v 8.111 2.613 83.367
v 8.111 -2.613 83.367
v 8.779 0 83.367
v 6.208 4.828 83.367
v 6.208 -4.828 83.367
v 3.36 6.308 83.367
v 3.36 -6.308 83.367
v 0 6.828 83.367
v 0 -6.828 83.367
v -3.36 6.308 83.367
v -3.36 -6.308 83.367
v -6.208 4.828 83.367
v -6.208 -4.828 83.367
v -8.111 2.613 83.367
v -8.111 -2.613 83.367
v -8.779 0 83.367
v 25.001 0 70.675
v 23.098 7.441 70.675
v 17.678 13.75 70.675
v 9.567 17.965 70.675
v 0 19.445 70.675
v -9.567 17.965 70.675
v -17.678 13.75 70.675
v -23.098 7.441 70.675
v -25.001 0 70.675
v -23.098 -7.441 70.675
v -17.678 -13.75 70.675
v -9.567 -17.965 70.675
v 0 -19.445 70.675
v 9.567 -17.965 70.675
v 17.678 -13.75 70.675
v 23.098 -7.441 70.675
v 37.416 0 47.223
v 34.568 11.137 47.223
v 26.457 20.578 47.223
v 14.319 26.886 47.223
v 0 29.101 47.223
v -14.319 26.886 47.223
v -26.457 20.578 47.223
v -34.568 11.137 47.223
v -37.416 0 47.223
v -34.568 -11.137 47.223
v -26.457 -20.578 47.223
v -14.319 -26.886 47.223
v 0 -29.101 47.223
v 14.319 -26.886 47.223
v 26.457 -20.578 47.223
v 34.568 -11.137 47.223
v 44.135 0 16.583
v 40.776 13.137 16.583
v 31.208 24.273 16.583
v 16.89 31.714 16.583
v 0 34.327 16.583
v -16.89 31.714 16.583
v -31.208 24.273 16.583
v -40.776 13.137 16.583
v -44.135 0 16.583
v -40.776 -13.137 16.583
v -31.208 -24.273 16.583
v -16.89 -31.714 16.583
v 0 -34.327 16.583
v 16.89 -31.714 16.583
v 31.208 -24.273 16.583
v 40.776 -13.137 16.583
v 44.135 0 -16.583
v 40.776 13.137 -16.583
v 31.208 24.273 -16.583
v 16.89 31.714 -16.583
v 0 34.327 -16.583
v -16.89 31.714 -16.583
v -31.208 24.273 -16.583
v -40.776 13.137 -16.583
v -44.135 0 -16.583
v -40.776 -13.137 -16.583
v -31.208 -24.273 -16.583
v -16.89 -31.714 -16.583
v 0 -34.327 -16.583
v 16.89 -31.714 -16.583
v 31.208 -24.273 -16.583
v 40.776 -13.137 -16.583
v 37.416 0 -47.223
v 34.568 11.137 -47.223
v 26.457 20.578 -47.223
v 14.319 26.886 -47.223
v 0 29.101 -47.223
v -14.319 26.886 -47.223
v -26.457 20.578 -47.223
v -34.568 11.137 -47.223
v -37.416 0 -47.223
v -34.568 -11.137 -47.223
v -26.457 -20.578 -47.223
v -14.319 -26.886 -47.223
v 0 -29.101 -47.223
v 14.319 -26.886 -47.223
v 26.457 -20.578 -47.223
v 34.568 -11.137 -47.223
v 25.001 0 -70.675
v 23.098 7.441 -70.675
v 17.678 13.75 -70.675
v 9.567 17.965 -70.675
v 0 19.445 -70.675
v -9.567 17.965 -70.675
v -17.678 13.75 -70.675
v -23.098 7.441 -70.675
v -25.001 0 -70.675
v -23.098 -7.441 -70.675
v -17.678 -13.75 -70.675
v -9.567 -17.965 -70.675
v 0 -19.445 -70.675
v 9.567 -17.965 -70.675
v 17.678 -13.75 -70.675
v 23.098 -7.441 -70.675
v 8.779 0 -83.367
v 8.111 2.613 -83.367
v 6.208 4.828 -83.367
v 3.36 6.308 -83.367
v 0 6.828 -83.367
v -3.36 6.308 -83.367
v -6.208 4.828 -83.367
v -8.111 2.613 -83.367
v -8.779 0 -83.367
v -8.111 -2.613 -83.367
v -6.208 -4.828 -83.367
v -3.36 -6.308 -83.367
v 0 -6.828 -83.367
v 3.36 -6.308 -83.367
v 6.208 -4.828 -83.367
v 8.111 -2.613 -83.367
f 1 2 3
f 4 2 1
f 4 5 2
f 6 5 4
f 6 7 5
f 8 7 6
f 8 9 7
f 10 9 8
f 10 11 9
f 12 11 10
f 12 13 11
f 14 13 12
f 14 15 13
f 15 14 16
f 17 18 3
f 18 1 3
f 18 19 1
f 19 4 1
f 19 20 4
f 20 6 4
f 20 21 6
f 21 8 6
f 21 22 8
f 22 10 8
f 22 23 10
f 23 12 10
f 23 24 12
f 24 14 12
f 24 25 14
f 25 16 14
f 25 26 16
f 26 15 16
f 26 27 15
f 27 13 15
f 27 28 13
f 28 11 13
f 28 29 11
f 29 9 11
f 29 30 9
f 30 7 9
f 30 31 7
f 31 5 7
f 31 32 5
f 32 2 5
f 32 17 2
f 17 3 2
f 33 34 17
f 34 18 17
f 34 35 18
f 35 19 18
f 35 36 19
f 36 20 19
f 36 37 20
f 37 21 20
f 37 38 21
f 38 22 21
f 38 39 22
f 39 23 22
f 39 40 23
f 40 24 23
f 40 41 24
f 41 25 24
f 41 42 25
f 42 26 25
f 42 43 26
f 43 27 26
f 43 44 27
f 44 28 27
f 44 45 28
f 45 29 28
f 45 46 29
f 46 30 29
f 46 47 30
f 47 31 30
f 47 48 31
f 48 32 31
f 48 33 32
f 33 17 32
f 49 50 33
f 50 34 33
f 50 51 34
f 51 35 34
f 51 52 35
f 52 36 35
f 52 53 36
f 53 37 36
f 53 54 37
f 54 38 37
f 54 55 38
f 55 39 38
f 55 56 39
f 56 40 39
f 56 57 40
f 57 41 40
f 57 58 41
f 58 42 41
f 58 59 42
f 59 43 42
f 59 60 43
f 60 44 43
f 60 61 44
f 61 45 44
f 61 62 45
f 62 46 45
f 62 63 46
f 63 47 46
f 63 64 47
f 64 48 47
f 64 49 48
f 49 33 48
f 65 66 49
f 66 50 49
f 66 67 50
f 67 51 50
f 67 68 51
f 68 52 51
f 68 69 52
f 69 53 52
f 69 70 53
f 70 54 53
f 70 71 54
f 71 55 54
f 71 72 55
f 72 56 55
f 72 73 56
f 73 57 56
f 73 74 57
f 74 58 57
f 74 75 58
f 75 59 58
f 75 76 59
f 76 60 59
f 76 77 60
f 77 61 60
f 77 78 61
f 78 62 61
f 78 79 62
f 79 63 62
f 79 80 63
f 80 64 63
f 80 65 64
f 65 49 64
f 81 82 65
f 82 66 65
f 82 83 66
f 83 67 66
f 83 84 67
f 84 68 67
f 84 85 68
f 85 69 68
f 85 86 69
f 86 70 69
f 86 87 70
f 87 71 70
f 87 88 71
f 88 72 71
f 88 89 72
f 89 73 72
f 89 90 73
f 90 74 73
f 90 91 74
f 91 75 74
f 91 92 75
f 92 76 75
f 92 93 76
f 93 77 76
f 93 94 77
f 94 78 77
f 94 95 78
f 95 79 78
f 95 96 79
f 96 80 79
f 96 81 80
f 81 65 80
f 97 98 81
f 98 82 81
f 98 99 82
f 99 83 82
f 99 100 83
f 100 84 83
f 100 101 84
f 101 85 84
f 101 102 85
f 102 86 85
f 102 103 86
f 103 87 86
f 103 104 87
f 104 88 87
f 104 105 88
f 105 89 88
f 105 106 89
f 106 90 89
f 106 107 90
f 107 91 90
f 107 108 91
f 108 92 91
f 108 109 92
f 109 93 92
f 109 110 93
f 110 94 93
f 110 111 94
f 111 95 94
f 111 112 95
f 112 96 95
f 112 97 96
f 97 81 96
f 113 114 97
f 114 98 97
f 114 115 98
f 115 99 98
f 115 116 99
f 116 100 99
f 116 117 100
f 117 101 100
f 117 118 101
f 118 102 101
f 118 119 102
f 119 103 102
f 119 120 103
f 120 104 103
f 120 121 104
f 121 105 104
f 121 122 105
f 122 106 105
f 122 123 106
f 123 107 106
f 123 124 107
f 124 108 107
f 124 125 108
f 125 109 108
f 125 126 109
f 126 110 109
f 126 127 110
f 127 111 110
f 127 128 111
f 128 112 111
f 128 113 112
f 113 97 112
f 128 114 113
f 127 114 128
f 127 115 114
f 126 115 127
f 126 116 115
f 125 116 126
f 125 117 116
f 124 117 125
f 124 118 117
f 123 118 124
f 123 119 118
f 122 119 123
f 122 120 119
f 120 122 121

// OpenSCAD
// Generated by SolidPython 1.0.1 on 2020-07-29 00:46:48


scale(v = [9, 7, 17]) {
	sphere(r = 5);
}
/***********************************************
*********      SolidPython code:      **********
************************************************
 
# import packages: SolidPython
from solid import *
from solid.utils import *
from itertools import chain, combinations, permutations


class Resize:

    def __init__(self, scad_file):
        self.scad_file = scad_file
        #self.scad_file = import_scad(scad_file)
        # cone/cylinder param:
        self.r1 = 0
        self.r2 = 0
        self.h = 0
        # rectangular prism param:
        self.w = 0
        self.l = 0
        # ellipse param:
        self.r = 0

    # import OpenScad code (file name corresponds to shape)


    # classify shape + parameters
    def assign(self, param1, param2, param3):
        if self.scad_file == 'cone.scad':
            self.r1 = param1
            self.r2 = param2
            self.h = param3
        elif self.scad_file == 'cylinder.scad':
            self.r1 = param1
            self.r2 = param2
            self.h = param3
        elif self.scad_file == 'rectangularPrism.scad':
            self.h = param1
            self.l = param2
            self.w = param3
        else:
            self.r = param1
            self.h = param2

    # resize parameters
    def iterate(self):
        x = range(3, 20, 2)
        i = 1
        if self.scad_file == 'cone.scad':
            tempList = list(permutations(x, 2))
            for temp in tempList:
                param1 = temp[0]
                param2 = temp[1]
                filepath = 'produced_scad_files/' + 'cone' + str(param1) + '_' + str(param2) + '_' + '.scad'
                scad_render_to_file(cylinder(h=param1, r1=param2, r2=0), filepath)

        elif self.scad_file == 'cylinder.scad':
            tempList = list(permutations(x, 3))
            for temp in tempList:
                param1 = temp[0]
                param2 = temp[1]
                filepath = 'produced_scad_files/' + 'cylinder' + str(param1) + '_' + str(param2) + '_' + '.scad'
                scad_render_to_file(cylinder(h=param1, r1=param2, r2=param2), filepath)

        elif self.scad_file == 'rectangularPrism.scad':
            tempList = list(permutations(x, 3))
            for temp in tempList:
                param1 = temp[0]
                param2 = temp[1]
                param3 = temp[2]
                filepath = 'produced_scad_files/' + 'rectangularPrism' + str(param1) + '_' + str(param2) + '_' + str(
                    param3) + '.scad'
                scad_render_to_file(cube(size=(param1, param2, param3)), filepath)

        elif self.scad_file == 'ellipse.scad':
            tempList = list(permutations(x, 4))
            for temp in tempList:
                param1 = temp[0]
                param2 = temp[1]
                param3 = temp[2]
                param4 = temp[3]
                filepath = 'produced_scad_files/' + 'ellipse' + str(param1) + '_' + str(param2) + '_' + str(param3) + '_' + str(param4) + '.scad'
                scad_render_to_file(scale([param1, param2, param3])(sphere(r=param4)), filepath)

    def render_to_scadfile(self):
        scad_render_to_file(scad, 'example.scad') 
 
************************************************/
